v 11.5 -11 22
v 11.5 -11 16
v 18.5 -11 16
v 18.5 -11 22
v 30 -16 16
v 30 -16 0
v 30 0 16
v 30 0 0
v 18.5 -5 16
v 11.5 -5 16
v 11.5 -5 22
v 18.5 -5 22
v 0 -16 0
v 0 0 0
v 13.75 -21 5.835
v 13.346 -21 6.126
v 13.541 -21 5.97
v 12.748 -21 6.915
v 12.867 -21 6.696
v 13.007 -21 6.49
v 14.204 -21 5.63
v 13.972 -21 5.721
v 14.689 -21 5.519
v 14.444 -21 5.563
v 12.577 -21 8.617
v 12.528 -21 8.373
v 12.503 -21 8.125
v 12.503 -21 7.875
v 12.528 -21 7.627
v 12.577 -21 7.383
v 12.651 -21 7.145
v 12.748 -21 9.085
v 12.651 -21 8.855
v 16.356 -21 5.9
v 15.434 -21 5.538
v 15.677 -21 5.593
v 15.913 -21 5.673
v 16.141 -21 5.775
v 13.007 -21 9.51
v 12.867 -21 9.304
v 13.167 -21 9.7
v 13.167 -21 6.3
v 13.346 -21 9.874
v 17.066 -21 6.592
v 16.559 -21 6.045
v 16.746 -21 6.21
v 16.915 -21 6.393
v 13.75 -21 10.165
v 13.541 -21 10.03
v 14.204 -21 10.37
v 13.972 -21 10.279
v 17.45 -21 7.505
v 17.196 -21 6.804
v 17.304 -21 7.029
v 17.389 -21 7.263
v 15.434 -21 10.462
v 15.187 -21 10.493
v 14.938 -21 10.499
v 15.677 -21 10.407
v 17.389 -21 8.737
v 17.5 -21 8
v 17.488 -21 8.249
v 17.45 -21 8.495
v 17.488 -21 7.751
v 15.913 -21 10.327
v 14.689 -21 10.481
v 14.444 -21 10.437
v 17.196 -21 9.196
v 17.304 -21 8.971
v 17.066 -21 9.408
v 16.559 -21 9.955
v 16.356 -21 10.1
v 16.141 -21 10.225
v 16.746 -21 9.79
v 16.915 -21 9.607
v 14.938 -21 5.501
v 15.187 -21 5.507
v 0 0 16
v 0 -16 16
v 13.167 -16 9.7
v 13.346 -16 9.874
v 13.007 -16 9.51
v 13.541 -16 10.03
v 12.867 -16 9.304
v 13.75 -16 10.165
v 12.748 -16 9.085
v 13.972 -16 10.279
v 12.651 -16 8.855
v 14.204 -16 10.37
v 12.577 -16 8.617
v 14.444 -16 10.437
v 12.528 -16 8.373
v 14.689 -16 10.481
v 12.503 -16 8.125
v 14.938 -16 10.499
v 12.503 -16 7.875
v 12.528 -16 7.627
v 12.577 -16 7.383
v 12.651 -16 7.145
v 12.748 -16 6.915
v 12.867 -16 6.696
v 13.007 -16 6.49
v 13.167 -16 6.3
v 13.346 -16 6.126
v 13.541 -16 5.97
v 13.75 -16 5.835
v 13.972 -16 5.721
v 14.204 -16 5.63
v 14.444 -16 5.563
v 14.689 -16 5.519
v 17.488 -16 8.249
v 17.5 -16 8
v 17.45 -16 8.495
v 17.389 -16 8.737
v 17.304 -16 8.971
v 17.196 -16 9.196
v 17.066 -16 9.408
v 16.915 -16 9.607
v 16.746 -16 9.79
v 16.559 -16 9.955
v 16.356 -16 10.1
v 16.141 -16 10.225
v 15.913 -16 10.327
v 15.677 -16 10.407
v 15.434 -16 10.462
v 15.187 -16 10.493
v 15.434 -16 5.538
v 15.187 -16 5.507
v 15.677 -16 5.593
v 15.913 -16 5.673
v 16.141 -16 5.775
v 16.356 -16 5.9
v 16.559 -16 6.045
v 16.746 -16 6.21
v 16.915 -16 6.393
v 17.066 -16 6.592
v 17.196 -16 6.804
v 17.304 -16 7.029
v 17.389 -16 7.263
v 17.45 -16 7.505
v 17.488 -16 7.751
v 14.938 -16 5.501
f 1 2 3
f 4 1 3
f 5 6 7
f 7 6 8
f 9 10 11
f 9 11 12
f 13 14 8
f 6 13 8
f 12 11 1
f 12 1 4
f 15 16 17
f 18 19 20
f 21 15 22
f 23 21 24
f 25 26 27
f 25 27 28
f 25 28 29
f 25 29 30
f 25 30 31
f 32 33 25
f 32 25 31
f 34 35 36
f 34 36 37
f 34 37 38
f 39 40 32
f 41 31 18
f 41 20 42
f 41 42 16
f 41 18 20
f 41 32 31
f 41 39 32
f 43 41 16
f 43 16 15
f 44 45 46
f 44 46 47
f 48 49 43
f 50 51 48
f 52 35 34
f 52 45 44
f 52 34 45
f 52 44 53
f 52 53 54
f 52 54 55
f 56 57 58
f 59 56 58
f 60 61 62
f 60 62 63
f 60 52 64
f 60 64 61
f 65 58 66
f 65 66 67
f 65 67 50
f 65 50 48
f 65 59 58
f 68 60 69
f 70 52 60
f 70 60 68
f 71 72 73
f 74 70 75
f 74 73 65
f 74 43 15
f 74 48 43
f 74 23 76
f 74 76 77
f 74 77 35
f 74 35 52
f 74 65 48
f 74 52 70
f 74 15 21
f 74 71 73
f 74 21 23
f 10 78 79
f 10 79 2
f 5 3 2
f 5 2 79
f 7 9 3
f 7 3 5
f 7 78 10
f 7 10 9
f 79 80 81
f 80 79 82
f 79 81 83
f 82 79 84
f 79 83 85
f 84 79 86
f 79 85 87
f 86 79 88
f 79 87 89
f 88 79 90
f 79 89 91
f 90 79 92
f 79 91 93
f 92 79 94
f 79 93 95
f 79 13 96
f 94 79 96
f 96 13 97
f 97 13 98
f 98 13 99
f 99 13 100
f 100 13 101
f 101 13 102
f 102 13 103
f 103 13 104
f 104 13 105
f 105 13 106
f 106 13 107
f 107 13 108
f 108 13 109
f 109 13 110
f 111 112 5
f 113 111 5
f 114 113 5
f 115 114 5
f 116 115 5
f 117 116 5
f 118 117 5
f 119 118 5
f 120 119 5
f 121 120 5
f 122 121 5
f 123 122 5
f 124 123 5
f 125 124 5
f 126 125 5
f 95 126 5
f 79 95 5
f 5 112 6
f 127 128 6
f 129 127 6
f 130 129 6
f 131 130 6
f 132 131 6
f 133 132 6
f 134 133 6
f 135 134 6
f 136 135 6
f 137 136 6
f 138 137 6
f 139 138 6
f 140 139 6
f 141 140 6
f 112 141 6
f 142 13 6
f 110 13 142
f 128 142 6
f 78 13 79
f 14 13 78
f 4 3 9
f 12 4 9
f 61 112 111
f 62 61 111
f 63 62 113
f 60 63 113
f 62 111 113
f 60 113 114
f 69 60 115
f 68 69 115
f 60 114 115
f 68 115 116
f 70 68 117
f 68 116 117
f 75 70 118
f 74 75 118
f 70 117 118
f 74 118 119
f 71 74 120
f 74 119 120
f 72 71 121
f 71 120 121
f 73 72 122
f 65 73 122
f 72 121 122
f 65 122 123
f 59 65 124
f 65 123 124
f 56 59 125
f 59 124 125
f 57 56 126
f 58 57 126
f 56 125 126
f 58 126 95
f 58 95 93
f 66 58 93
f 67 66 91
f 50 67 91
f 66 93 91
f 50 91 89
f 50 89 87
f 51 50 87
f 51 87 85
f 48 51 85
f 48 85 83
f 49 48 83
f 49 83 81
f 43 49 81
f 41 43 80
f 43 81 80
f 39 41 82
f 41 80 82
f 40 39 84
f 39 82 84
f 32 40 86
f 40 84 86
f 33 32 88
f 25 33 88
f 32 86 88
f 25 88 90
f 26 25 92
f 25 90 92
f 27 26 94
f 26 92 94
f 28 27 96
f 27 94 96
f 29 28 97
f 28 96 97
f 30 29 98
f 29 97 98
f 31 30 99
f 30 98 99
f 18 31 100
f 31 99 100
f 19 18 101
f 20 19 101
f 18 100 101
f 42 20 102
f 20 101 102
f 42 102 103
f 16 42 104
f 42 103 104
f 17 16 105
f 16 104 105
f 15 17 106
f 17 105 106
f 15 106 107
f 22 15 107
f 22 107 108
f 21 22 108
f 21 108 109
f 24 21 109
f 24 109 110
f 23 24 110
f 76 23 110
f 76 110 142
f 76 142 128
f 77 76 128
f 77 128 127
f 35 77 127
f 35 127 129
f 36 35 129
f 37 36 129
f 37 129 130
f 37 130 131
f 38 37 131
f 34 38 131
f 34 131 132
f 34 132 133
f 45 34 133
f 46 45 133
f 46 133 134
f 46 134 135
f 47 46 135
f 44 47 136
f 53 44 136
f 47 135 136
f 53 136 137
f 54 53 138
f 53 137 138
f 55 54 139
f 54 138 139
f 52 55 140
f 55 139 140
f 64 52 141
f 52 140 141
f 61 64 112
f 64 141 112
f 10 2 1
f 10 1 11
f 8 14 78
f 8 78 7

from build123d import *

# Parameters (mm, degrees)
F0_W     = 30
F0_H     = 16
F1_DEPTH = 16
F2_W     = 7
F2_H     = 6
F3_DEPTH = 6
F4_R     = 2.5
F5_DEPTH = 5


with BuildPart() as f1:
    # F0 (on Top) → F1 (new body)
    with BuildSketch(Plane.XY):
        with Locations((15, -8)):
            Rectangle(F0_W, F0_H)
    extrude(amount=F1_DEPTH)

    # F2 (on face) → F3 (join)
    with BuildSketch(Plane.XY.offset(16)):
        with Locations((15, -8)):
            Rectangle(F2_W, F2_H)
    extrude(amount=F3_DEPTH)

    # F4 (on face) → F5 (join)
    with BuildSketch(Plane.XZ.offset(16)):
        with Locations((15, 8)):
            Circle(F4_R)
    extrude(amount=F5_DEPTH)


solid = f1.part
